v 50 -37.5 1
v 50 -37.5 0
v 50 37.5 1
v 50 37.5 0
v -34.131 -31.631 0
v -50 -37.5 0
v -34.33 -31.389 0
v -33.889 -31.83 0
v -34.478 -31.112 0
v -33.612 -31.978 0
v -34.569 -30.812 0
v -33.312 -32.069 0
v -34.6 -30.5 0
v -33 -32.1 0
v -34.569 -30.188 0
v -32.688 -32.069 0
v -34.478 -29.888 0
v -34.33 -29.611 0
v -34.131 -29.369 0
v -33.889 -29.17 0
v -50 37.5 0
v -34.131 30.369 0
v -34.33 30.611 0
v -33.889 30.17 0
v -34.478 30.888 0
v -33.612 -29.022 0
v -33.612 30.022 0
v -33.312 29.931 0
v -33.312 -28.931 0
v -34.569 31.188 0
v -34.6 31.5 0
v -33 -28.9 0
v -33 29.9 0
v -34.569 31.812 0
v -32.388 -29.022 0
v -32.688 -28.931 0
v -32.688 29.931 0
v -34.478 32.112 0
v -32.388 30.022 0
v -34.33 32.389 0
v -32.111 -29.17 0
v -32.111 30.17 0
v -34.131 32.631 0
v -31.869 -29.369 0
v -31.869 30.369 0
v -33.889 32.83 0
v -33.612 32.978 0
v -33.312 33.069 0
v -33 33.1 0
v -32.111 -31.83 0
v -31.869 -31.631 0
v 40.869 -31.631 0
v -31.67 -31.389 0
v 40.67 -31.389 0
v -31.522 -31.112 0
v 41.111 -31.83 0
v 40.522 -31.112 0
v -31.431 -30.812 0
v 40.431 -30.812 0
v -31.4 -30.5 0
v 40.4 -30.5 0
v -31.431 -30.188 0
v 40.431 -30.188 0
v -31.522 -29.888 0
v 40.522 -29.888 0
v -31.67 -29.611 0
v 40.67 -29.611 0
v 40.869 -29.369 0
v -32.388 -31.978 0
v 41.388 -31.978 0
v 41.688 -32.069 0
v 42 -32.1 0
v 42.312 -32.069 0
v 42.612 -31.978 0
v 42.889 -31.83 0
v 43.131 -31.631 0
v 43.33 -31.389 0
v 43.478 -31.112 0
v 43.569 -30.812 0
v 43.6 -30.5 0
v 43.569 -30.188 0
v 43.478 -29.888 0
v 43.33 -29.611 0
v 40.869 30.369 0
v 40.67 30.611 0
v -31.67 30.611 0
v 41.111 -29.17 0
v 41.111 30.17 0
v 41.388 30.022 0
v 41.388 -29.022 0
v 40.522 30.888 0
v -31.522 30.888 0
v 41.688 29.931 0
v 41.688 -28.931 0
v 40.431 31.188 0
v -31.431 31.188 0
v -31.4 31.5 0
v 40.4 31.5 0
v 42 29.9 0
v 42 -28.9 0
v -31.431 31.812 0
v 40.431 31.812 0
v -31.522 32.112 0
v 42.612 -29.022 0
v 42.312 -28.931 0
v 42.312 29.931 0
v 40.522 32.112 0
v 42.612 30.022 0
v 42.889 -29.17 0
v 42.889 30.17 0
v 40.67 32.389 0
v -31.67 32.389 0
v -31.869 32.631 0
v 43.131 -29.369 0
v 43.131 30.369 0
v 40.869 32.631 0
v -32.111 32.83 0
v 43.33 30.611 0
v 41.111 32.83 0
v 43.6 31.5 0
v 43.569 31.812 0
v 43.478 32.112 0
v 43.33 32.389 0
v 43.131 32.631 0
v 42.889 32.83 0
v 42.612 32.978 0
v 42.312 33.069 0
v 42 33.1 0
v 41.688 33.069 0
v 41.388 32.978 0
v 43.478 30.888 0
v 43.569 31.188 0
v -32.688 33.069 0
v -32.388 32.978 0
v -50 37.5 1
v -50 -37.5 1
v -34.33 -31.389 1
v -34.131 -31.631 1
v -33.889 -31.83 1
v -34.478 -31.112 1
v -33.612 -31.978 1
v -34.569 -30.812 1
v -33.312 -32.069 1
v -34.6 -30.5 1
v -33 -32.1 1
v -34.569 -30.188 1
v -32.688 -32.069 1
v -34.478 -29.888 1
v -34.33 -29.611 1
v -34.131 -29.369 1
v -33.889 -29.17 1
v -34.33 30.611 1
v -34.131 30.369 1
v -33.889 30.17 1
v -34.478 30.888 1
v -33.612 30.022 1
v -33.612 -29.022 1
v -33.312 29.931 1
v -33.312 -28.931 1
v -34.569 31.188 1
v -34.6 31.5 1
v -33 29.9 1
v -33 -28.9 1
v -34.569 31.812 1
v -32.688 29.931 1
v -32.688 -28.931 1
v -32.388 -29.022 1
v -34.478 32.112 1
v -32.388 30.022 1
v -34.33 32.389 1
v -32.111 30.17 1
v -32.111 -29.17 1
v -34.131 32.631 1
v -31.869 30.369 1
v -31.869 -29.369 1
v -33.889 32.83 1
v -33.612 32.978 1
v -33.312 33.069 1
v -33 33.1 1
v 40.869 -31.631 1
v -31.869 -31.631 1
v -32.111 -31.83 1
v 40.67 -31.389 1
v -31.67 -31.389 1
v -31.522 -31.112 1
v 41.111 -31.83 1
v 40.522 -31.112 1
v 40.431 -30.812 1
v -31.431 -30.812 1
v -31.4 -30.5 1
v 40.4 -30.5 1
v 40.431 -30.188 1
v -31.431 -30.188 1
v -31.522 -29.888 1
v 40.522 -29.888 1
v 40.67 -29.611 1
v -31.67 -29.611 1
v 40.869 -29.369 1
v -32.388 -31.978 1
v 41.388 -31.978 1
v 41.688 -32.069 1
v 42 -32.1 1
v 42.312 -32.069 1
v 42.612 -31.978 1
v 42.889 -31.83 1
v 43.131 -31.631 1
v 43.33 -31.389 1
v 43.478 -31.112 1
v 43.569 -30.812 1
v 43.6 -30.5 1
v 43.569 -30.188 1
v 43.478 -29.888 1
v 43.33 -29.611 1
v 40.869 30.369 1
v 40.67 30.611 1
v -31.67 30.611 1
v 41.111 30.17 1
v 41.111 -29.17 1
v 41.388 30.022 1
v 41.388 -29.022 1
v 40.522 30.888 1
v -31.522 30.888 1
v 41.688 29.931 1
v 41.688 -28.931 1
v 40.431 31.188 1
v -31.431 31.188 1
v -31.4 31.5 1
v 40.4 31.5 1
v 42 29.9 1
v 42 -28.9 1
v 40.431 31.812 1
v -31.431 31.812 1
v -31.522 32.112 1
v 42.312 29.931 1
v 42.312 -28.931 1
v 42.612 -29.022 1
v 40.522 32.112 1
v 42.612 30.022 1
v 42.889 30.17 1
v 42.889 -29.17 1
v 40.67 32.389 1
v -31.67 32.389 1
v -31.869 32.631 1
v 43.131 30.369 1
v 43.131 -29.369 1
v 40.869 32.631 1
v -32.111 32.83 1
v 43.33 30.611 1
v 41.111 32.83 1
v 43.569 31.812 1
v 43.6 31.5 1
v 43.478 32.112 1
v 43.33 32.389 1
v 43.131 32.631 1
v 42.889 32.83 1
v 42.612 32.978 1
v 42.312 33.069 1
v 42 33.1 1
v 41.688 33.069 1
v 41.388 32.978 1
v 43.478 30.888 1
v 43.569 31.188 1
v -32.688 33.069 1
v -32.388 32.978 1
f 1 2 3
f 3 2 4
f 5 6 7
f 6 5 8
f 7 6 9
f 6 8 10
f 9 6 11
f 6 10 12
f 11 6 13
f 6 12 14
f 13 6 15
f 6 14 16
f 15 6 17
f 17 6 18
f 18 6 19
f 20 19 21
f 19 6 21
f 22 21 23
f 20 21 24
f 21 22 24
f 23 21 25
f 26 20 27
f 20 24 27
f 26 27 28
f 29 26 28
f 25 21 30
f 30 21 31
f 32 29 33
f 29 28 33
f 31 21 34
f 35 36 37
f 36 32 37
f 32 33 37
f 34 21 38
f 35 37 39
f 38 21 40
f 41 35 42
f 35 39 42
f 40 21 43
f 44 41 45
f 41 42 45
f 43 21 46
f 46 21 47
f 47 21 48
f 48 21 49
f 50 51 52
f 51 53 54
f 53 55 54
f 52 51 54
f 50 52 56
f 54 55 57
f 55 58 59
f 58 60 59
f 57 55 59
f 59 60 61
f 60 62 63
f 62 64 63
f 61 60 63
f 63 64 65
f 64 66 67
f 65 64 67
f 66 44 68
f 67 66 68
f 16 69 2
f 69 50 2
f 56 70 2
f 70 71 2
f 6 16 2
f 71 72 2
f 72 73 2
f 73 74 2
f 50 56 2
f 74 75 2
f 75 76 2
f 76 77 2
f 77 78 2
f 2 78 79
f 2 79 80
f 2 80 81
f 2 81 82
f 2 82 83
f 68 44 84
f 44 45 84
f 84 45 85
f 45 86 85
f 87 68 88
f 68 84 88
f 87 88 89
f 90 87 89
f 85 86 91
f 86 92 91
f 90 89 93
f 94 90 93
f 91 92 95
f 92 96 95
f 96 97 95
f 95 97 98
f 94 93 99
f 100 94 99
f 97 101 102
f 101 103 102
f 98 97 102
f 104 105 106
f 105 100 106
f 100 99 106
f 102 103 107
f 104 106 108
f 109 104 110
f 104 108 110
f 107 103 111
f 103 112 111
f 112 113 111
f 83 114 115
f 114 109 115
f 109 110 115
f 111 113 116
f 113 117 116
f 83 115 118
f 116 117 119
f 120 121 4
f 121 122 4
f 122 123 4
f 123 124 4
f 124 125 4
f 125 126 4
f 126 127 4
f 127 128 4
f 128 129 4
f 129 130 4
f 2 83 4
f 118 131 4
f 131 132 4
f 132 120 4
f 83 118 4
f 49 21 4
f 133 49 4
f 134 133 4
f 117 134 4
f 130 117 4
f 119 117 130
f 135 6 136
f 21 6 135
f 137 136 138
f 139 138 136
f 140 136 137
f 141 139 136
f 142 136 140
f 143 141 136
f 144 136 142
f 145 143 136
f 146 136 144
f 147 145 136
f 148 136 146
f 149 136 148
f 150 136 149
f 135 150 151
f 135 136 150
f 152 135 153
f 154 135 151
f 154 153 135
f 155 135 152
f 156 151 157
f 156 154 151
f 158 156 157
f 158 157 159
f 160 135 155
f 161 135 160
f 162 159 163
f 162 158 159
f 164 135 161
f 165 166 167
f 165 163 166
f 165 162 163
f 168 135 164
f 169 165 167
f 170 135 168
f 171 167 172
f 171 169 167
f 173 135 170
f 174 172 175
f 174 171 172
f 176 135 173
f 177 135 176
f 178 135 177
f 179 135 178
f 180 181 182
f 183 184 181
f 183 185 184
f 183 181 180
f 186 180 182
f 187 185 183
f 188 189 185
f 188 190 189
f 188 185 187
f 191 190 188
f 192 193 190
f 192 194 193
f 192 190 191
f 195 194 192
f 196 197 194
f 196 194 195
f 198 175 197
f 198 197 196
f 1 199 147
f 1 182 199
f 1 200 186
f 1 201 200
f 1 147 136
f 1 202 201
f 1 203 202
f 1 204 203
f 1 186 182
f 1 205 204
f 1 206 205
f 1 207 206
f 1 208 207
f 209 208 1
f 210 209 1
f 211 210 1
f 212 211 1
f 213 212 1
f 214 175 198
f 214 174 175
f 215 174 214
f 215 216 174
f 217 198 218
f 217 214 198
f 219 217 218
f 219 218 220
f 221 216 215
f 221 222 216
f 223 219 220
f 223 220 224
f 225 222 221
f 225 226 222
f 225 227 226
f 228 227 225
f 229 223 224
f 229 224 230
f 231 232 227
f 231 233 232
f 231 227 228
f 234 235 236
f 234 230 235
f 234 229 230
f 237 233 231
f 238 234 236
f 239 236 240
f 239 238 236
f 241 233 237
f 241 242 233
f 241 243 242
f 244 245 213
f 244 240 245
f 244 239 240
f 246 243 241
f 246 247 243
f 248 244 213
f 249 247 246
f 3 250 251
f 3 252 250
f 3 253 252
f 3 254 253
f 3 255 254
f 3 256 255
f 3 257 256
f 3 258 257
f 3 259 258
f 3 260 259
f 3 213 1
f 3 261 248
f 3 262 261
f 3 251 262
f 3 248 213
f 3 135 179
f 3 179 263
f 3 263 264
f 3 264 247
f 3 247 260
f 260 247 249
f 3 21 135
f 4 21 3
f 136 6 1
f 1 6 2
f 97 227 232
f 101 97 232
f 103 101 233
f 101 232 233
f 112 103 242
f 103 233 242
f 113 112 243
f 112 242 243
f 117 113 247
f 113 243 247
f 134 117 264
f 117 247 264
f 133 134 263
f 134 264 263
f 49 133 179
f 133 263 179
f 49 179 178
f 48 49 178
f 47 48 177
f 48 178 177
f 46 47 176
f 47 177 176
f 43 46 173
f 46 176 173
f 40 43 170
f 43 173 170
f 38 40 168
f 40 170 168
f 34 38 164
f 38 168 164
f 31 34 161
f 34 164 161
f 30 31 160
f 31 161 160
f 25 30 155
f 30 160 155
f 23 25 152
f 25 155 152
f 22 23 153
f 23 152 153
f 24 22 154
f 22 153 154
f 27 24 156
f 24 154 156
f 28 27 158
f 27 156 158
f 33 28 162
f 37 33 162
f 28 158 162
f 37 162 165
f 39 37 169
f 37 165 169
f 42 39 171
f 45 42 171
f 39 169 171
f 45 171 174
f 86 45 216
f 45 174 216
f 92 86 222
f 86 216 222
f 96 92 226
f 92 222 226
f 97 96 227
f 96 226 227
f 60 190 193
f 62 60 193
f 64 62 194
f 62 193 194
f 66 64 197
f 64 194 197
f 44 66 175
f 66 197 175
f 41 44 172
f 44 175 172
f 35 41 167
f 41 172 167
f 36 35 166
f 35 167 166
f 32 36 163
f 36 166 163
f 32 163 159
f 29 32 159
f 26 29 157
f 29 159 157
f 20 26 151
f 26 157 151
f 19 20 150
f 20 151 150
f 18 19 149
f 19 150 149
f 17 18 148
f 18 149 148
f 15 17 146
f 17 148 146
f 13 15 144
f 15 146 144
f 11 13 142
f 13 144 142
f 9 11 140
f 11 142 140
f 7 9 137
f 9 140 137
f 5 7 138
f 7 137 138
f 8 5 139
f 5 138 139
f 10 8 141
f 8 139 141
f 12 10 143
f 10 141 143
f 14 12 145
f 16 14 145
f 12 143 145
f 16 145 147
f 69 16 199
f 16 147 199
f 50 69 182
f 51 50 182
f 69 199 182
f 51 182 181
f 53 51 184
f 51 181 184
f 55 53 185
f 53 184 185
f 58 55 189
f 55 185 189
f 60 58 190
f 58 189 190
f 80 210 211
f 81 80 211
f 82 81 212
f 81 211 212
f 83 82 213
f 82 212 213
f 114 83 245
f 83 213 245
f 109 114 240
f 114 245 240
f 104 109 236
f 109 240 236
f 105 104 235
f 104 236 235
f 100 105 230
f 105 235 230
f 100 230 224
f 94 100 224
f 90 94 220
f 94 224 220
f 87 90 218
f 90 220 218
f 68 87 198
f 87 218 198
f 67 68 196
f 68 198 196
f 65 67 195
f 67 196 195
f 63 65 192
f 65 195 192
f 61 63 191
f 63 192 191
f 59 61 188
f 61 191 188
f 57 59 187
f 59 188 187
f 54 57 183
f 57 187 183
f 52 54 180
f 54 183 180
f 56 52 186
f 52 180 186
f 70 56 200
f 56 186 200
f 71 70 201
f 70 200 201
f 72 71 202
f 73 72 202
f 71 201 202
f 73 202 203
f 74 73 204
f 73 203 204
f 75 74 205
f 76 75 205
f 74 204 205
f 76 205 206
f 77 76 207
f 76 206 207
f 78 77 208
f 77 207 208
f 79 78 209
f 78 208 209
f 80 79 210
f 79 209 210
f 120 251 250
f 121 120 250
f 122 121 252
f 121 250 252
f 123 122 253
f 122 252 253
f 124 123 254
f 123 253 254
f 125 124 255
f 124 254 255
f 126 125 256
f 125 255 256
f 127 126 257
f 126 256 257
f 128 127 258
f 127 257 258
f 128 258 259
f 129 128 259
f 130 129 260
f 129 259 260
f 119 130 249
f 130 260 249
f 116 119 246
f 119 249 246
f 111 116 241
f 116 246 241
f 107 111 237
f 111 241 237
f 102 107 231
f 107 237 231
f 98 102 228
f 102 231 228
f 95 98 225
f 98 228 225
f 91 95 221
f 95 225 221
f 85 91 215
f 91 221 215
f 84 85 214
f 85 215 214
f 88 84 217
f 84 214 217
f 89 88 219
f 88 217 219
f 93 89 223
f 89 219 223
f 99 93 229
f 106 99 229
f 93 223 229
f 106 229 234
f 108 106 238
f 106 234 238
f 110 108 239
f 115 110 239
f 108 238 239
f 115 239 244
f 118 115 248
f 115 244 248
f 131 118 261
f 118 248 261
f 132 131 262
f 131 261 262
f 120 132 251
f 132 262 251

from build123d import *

# Parameters (mm, degrees)
SKETCH_1_W                  = 100
SKETCH_1_H                  = 75
EXTRUDE_1_DEPTH             = 1
SKETCH_2_R                  = 1.6
CUT_EXTRUDE_1_DEPTH         = 1
PATTERN_LINEAR_1_COUNT      = 2
PATTERN_LINEAR_1_PITCH      = 75
PATTERN_LINEAR_1_COUNT_DIR2 = 2
PATTERN_LINEAR_1_PITCH_DIR2 = 62


with BuildPart() as part:
    # ｽｹｯﾁ1 → ﾎﾞｽ - 押し出し1 (new body)
    with BuildSketch(Plane.XY):
        Rectangle(SKETCH_1_W, SKETCH_1_H)
    extrude(amount=EXTRUDE_1_DEPTH)

    # ｽｹｯﾁ2 → ｶｯﾄ - 押し出し1 (cut)
    with BuildSketch(Plane.XY.offset(1)):
        with Locations((42, -30.5)):
            Circle(SKETCH_2_R)
    cut_extrude_1 = extrude(amount=-CUT_EXTRUDE_1_DEPTH, mode=Mode.SUBTRACT)

    # 直線ﾊﾟﾀｰﾝ1: Cut-Extrude 1 2 × 2
    with Locations(*[(-i * PATTERN_LINEAR_1_PITCH, j * PATTERN_LINEAR_1_PITCH_DIR2, 0) for i in range(PATTERN_LINEAR_1_COUNT) for j in range(PATTERN_LINEAR_1_COUNT_DIR2) if (i, j) != (0, 0)]):
        add(cut_extrude_1, mode=Mode.SUBTRACT)


solid = part.part
